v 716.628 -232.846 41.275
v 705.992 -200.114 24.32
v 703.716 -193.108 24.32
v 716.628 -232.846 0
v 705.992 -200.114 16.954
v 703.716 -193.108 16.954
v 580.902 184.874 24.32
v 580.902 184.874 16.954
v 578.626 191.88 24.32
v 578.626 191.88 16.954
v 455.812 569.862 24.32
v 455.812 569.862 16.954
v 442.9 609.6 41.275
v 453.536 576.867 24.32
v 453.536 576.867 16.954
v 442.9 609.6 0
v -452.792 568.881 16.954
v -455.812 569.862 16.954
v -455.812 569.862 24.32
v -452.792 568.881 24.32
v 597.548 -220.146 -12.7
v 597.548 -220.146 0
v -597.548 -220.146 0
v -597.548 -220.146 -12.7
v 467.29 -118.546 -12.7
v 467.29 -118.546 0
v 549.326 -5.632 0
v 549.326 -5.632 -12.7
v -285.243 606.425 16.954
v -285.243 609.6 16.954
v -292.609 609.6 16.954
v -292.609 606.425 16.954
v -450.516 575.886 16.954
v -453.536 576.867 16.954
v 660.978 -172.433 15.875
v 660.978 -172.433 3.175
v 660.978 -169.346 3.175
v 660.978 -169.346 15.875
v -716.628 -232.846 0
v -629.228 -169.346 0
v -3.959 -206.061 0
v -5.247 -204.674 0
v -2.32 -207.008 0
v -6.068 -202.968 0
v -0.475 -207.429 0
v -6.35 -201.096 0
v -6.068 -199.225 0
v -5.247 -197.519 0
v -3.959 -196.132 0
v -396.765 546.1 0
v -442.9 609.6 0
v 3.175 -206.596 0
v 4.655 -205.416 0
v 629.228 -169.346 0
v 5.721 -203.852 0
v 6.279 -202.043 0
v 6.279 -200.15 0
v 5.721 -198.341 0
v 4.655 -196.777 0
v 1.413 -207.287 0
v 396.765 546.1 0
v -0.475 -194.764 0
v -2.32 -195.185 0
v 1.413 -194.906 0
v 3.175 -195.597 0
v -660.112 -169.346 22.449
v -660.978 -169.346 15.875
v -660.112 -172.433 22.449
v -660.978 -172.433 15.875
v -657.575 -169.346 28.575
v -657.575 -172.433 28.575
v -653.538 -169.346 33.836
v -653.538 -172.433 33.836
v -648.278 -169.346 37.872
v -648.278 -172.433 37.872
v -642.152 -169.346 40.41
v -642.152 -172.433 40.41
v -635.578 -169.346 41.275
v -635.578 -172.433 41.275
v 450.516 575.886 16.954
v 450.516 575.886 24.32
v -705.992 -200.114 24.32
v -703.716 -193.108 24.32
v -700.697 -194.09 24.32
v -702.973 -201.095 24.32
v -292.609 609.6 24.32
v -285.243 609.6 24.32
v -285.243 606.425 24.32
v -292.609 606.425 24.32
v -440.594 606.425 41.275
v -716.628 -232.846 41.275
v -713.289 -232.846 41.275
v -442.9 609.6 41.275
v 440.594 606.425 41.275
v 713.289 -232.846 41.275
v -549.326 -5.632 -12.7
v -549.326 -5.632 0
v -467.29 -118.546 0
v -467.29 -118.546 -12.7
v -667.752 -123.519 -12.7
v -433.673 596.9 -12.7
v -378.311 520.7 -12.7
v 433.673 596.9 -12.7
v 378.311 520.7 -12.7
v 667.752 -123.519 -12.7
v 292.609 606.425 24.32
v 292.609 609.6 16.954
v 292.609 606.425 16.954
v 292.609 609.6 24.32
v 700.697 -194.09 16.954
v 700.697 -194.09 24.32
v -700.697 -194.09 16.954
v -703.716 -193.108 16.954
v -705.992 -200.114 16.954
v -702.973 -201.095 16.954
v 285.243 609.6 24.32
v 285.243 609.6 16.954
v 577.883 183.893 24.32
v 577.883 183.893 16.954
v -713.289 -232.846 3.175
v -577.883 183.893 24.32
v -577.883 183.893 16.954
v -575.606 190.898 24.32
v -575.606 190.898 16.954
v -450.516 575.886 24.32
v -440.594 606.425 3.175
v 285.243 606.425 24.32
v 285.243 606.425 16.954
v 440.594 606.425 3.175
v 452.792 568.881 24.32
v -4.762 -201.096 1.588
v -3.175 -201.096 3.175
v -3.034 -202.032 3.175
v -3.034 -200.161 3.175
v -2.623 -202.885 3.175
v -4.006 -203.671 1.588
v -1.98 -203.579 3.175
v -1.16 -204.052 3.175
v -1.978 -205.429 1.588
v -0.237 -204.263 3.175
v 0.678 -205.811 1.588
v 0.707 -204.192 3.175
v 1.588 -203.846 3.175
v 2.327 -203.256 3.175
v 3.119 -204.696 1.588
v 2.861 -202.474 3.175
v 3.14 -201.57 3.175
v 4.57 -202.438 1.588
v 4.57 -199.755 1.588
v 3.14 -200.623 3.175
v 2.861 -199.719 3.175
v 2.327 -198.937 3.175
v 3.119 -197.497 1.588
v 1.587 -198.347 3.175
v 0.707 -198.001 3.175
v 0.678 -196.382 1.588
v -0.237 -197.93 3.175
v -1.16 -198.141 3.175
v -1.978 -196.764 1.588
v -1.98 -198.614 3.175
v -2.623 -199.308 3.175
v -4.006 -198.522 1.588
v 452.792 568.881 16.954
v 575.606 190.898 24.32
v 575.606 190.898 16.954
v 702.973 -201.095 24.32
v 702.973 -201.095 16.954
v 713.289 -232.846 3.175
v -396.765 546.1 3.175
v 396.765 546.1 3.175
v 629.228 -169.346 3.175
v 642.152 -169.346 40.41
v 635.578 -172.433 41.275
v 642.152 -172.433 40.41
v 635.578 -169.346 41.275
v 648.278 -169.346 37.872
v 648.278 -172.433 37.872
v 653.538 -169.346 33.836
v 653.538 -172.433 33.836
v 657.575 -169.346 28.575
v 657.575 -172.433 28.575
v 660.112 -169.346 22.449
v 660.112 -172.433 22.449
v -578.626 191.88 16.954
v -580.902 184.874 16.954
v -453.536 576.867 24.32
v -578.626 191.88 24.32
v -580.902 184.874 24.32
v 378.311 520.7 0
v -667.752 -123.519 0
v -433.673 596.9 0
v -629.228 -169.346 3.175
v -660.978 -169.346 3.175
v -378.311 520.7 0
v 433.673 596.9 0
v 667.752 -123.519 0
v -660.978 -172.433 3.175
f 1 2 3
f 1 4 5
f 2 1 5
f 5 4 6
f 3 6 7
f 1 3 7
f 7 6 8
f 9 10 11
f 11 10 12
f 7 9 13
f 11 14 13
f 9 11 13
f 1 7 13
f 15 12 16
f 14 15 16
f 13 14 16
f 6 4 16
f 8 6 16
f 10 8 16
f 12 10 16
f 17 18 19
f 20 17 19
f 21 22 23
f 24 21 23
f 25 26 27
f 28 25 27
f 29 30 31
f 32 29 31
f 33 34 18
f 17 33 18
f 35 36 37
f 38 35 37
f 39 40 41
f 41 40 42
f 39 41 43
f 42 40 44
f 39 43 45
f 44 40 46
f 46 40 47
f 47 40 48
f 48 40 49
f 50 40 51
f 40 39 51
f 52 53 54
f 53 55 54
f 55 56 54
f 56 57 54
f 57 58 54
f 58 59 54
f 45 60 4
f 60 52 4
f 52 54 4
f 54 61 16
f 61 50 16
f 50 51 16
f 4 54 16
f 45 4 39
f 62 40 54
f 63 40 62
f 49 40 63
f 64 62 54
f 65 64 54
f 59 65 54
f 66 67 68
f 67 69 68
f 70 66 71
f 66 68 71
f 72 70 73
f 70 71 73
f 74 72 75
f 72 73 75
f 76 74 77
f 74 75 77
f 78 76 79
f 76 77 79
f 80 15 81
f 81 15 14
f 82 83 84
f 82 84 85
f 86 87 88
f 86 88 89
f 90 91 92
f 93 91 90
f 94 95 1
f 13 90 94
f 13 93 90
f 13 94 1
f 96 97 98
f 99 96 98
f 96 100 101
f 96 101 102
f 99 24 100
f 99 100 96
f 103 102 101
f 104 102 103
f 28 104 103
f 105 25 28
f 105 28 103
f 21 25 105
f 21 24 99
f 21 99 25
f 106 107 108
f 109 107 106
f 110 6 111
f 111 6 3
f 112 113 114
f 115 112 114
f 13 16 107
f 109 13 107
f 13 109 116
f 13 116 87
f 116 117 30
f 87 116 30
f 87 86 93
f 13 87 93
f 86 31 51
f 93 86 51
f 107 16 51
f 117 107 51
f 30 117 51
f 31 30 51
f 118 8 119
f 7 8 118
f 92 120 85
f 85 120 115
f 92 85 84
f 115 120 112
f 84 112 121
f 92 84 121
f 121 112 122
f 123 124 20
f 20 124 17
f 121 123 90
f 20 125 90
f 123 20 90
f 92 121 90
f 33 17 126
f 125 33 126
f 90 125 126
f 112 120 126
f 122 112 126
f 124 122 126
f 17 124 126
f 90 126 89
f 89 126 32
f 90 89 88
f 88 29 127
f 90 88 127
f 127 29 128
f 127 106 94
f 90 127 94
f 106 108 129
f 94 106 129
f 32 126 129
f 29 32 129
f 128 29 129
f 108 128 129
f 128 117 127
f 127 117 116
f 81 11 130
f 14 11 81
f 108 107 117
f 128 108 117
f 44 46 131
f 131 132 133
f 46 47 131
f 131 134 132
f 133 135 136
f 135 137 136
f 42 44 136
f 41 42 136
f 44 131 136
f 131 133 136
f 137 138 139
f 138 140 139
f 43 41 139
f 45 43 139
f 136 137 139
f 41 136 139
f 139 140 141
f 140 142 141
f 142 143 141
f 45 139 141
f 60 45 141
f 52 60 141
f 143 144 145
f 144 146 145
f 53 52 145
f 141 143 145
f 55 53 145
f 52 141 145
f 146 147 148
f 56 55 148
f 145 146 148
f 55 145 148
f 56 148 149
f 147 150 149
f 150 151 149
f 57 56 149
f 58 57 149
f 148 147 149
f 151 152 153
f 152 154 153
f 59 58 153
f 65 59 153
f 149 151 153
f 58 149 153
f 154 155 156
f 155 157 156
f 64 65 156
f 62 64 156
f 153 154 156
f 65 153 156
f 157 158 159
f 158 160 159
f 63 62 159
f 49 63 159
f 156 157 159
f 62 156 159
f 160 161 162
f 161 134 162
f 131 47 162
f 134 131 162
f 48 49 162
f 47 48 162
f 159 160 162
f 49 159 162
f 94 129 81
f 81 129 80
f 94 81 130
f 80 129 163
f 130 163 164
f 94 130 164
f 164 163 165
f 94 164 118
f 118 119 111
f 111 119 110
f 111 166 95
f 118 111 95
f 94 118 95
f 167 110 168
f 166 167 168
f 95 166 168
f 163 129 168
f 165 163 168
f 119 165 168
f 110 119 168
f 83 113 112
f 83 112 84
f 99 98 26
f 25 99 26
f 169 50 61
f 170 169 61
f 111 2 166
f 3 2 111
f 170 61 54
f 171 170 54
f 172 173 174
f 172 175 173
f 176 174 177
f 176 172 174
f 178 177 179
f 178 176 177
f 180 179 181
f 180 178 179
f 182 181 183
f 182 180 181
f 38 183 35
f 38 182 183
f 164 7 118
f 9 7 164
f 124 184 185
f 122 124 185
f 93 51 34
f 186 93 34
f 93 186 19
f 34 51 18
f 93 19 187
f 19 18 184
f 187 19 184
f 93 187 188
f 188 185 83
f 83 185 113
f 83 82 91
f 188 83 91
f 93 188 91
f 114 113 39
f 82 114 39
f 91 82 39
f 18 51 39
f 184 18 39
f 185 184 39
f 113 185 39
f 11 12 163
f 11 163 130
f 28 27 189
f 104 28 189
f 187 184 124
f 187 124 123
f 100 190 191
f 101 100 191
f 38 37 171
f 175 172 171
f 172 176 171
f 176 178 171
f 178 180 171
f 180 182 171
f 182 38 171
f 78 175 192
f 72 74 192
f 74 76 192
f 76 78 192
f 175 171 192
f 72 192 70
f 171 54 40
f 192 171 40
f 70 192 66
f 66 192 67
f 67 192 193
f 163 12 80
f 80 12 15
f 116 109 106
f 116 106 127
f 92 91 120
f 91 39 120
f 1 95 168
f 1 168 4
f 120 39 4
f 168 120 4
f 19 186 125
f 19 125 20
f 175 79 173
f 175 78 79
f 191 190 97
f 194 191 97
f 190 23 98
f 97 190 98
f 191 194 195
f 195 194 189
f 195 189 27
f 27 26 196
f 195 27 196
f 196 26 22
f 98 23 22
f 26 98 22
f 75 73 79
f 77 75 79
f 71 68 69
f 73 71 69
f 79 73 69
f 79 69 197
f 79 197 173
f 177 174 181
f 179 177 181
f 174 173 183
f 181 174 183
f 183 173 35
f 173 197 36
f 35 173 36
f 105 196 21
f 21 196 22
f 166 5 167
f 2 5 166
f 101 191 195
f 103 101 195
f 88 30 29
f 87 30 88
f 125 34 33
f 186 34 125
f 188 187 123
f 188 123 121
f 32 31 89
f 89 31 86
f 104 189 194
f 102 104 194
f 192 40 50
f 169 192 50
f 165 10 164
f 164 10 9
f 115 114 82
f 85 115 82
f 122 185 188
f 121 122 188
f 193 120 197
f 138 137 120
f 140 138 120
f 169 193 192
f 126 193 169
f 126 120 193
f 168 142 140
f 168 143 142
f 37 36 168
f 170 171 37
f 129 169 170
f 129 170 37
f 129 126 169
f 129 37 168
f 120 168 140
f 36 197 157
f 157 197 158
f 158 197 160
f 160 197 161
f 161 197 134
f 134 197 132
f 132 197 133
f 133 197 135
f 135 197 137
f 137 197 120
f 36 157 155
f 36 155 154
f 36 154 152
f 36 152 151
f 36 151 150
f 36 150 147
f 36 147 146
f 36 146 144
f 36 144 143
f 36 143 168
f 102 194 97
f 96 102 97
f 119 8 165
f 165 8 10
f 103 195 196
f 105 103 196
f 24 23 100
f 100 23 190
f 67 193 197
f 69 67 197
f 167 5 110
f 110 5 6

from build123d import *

# Parameters (mm, degrees)
F1_DEPTH        = 3.175
F3_DEPTH        = 38.1
F5_DEPTH        = 38.1
F6_R            = 25.4
F7_W            = 7.366
F7_H            = 7.366
F8_DEPTH        = 25.4
F9_W            = 7.366
F9_H            = 7.366
F10_DEPTH       = 25.4
F12_DEPTH       = 12.7
F13_W           = 7.366
F13_H           = 7.366
F14_DEPTH       = 25.4
F16_D           = 6.35
F16_CSINK_D     = 12.7
F16_CSINK_ANGLE = 90


with BuildPart() as f1:
    # F0 (on Top) → F1 (new body)
    with BuildSketch(Plane.XY):
        Polygon((-442.9003250721, 609.6), (-716.627779595, -232.8464804581), (-713.289387033, -232.8464804581), (-440.5935525457, 606.425), (440.5935525457, 606.425), (713.289387033, -232.8464804581), (716.627779595, -232.8464804581), (442.9003250721, 609.6), align=None)
        Polygon((-440.5935525457, 606.425), (-713.289387033, -232.8464804581), (713.289387033, -232.8464804581), (440.5935525457, 606.425), align=None)
        Polygon((629.2275276451, -169.3464804581), (-629.2275276451, -169.3464804581), (-396.7648745437, 546.1), (396.7648745437, 546.1), align=None, mode=Mode.SUBTRACT)
    extrude(amount=F1_DEPTH)

    # F2 (on face) → F3 (join)
    with BuildSketch(Plane.XY.offset(3.175)):
        Polygon((-442.9003250721, 609.6), (-716.627779595, -232.8464804581), (-713.289387033, -232.8464804581), (-440.5935525457, 606.425), (440.5935525457, 606.425), (713.289387033, -232.8464804581), (716.627779595, -232.8464804581), (442.9003250721, 609.6), align=None)
    extrude(amount=F3_DEPTH)

    # F4 (on face) → F5 (join)
    with BuildSketch(Plane.XY.offset(3.175)):
        Polygon((629.2275276451, -169.3464804581), (-629.2275276451, -169.3464804581), (-660.9775276451, -169.3464804581), (-660.9775276451, -172.4325804581), (660.9775276451, -172.4325804581), (660.9775276451, -169.3464804581), align=None)
    extrude(amount=F5_DEPTH)

    # F6
    f6_edges = [f1.edges().sort_by_distance(p)[0] for p in [
        (660.977528, -170.88953, 41.275),
        (-660.977528, -170.88953, 41.275),
    ]]
    fillet(f6_edges, radius=F6_R)

    # F7 (on face) → F8 (cut)
    with BuildSketch(Plane(origin=(579.7640523335, 188.376759771, 0), x_dir=(-0.3090169944, 0.9510565163, 0), z_dir=(0.9510565163, 0.3090169944, 0))):
        with Locations((404.8003250721, 20.6375)):
            Rectangle(F7_W, F7_H)
        with Locations((0, 20.6375)):
            Rectangle(F7_W, F7_H)
        with Locations((-404.8003250721, 20.6375)):
            Rectangle(F7_W, F7_H)
    extrude(amount=-F8_DEPTH, mode=Mode.SUBTRACT)

    # F9 (on face) → F10 (cut)
    with BuildSketch(Plane(origin=(-579.7640523335, 188.376759771, 0), x_dir=(-0.3090169944, -0.9510565163, 0), z_dir=(-0.9510565163, 0.3090169944, 0))):
        with Locations((-404.8003250721, 20.6375)):
            Rectangle(F9_W, F9_H)
        with Locations((0, 20.6375)):
            Rectangle(F9_W, F9_H)
        with Locations((404.8003250721, 20.6375)):
            Rectangle(F9_W, F9_H)
    extrude(amount=-F10_DEPTH, mode=Mode.SUBTRACT)

    # F13 (on face) → F14 (cut)
    with BuildSketch(Plane(origin=(0, 609.6, 0), x_dir=(-1, 0, 0), z_dir=(0, 1, 0))):
        with Locations((288.9255250721, 20.6375)):
            Rectangle(F13_W, F13_H)
        with Locations((-288.9255250721, 20.6375)):
            Rectangle(F13_W, F13_H)
    extrude(amount=-F14_DEPTH, mode=Mode.SUBTRACT)

    # F16 (through all)
    with Locations(Plane(origin=(0, 0, 0), x_dir=(1, 0, 0), z_dir=(0, 0, -1))):
        with Locations((0, 201.0964804581)):
            CounterSinkHole(F16_D / 2, F16_CSINK_D / 2, counter_sink_angle=F16_CSINK_ANGLE)


with BuildPart() as f12:
    # F11 (on face) → F12 (new body)
    with BuildSketch(Plane(origin=(0, 0, 0), x_dir=(1, 0, 0), z_dir=(0, 0, -1))):
        Polygon((-597.547729205, 220.1464804581), (-667.7516025765, 123.5191384025), (-433.6732349664, -596.9), (433.6732349664, -596.9), (667.7516025765, 123.5191384025), (597.547729205, 220.1464804581), align=None)
        Polygon((396.7648745437, -546.1), (-396.7648745437, -546.1), (-629.2275276451, 169.3464804581), (629.2275276451, 169.3464804581), align=None, mode=Mode.SUBTRACT)
        Polygon((-629.2275276451, 169.3464804581), (-396.7648745437, -546.1), (396.7648745437, -546.1), (629.2275276451, 169.3464804581), align=None)
        Polygon((378.3106943324, -520.7), (-378.3106943324, -520.7), (-549.3264734851, 5.6324480955), (-467.2896269651, 118.5464804581), (467.2896269651, 118.5464804581), (549.3264734851, 5.6324480955), align=None, mode=Mode.SUBTRACT)
    extrude(amount=F12_DEPTH)


solid = Compound([f1.part, f12.part])
